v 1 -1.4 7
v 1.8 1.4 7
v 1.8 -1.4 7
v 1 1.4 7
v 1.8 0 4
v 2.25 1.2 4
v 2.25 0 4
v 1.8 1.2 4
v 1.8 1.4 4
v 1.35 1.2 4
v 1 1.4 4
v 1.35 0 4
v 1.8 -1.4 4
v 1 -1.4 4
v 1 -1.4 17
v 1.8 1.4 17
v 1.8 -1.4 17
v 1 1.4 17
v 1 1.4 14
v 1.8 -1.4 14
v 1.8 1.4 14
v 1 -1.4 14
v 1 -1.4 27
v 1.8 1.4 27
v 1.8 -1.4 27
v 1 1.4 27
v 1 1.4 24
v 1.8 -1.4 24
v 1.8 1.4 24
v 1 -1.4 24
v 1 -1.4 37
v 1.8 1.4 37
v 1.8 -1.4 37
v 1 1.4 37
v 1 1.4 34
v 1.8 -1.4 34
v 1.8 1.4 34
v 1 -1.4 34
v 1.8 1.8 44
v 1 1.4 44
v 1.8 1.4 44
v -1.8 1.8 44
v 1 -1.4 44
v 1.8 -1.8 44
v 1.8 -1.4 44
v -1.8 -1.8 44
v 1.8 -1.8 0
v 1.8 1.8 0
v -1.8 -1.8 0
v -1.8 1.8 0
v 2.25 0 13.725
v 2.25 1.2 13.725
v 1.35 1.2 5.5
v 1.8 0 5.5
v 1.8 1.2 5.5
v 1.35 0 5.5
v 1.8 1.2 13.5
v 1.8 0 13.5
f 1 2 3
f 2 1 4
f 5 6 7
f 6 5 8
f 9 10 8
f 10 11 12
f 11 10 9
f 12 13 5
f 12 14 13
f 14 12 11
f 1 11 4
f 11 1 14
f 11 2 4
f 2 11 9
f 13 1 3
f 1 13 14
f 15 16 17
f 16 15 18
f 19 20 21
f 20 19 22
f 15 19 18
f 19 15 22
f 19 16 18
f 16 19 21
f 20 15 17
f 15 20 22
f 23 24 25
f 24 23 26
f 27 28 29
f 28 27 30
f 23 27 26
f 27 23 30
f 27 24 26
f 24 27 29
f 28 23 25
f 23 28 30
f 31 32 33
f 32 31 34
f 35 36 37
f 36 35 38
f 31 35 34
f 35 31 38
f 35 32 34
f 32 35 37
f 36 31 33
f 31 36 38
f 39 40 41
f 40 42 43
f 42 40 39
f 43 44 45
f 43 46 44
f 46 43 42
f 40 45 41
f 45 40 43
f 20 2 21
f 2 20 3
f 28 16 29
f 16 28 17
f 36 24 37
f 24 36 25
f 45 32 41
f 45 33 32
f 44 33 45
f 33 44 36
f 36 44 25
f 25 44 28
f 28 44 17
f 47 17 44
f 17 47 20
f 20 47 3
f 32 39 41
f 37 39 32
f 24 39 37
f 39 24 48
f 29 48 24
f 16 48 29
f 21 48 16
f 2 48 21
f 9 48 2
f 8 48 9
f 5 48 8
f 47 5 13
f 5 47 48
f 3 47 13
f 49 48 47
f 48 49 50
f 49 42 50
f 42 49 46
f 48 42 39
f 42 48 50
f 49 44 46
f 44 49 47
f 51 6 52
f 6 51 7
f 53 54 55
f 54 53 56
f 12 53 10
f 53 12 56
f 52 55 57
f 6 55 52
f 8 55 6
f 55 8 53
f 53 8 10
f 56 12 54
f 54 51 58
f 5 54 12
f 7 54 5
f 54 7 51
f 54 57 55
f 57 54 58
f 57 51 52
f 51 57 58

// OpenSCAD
// DND-71 S6-LC ultra-low-cost shape display -- real OpenSCAD geometry.
//
// EVIDENCE CLASS: CAD (geometry only). No print, no measurement (DND-27).
// All dimensions are mirrored from ../analysis/s6lc.py.
//
// Machine: 8 banks of 10 rows (80x80 = 6,400 cells) at 5.08 mm pitch.
//   * square printed columns with a 5-pocket vertical rack (10 mm pockets);
//   * printed cantilever pawls (0.90 x 1.20 x 8.00 mm) holding a column;
//   * per-bank threshold mask gate (printed sliding comb) read from a medium;
//   * 8 banked release combs on a travelling reset carriage;
//   * one 4-screw belt-synced platen (printed frame, excluded from the BOM).
//
// Render (real OpenSCAD):
//   openscad -o s6lc_cell.stl       -D 'PART="cell"'    s6lc_machine.scad
//   openscad -o s6lc_bank.stl       -D 'PART="bank"'    s6lc_machine.scad
//   openscad -o s6lc_platen.stl     -D 'PART="platen"'  s6lc_machine.scad

PART = "cell";

// ---- product / geometry constants (analysis/s6lc.py) ----------------------
PITCH       = 5.08;
BODY        = 3.60;      // square column body (S1 lane budget: 3.60 + 1.48 = 5.08)
COL_H       = 44.0;      // column height (40 mm travel + 4 mm base)
TRAVEL      = 40.0;
LEVEL       = 10.0;
POCKET_H    = 3.0;       // rack pocket depth in Z
POCKET_D    = 0.8;       // rack pocket depth in X (S1 coupon)
PAWL_T      = 0.90;      // 2 extrusion lines
PAWL_W      = 1.20;
PAWL_L      = 8.00;
ROWS_BANK   = 10;
COLS        = 80;
BANKS       = 8;

$fn = 48;

module column_with_rack() {
    // Square column body with 5 rack pockets on the +X face.
    difference() {
        translate([-BODY/2, -BODY/2, 0]) cube([BODY, BODY, COL_H]);
        // rack pockets at 0,10,20,30,40 mm above the base
        for (k = [0:4]) {
            translate([BODY/2 - POCKET_D, -BODY/2 + 0.4, 4 + k*LEVEL])
                cube([POCKET_D + 1, BODY - 0.8, POCKET_H]);
        }
    }
}

module pawl() {
    // Rooted cantilever: base block + thin leaf with a wedge toe.
    // DND-97/A1: the ROOT block is anchored OUTBOARD of the pitch band (in the
    // frame); only the thin LEAF (PAWL_T/2 = 0.45 mm) enters the owned 0.74 mm
    // lane. Leaf set back so its outer face stays <= 0.74 mm from the body edge.
    translate([0, 0, 0]) cube([PAWL_T, PAWL_W, 1.5]);          // root block (frame side)
    translate([PAWL_T - PAWL_T/2, 0, 1.5])
        cube([PAWL_T/2, PAWL_W, PAWL_L]);                       // thin leaf (enters lane)
    // toe wedge at the free end (points into the rack)
    translate([PAWL_T - PAWL_T/2, 0, 1.5 + PAWL_L - 1.2])
        multmatrix([[1,0,0,0],[0,1,0,0],[0.5,0,1,0],[0,0,0,1]])
            cube([PAWL_T/2, PAWL_W, 1.2]);
}

module mask_gate() {
    // Printed sliding comb: body bar + bosses over cells that must be BLOCKED.
    // One per bank (COLS = 80 cells wide); boss pitch = PITCH.
    bar_w = COLS * PITCH;
    translate([0, 0, 0]) cube([bar_w, 1.2, 1.0]);
    for (i = [0 : COLS-1]) {
        // alternating boss pattern is illustrative geometry; the real pattern
        // comes from the map. This renders the printable comb envelope.
        if (i % 2 == 0)
            translate([i*PITCH + PITCH/2 - 0.44, -0.4, 1.0])
                cube([0.88, 2.0, 1.2]);
    }
}

module release_comb() {
    // One bank release comb: a bar with a toe under every cell, lifted by the
    // travelling carriage to trip all pawls of the bank at reset.
    bar_w = COLS * PITCH;
    translate([0, 0, 0]) cube([bar_w, 1.2, 1.0]);
    for (i = [0 : COLS-1]) {
        translate([i*PITCH + PITCH/2 - 0.44, 0.8, 1.0])
            cube([0.88, 1.6, 1.0]);
    }
}

module bank_row() {
    // One row of a bank: 80 cells at true pitch, with pawl + gate lanes.
    for (i = [0 : COLS-1]) {
        translate([i*PITCH, 0, 0]) {
            column_with_rack();
        }
    }
    // pawl lane sits in the Y gap between rows (not rendered per cell here for
    // clarity of the row envelope; the cell module includes the pawl).
}

module cell_assembly() {
    // The unit-cell mechanism: column + pawl (side-by-side lane) + gate lane.
    // DND-97/A1: body edge at BODY/2 = 1.80 mm; owned lane runs to the half
    // pitch 2.54 mm. Place the pawl root so the LEAF outer face stays within
    // the half pitch: origin x0 = BODY/2 - (PAWL_T - PAWL_T/2).
    column_with_rack();
    translate([BODY/2 - (PAWL_T - PAWL_T/2), 0, 4]) pawl();
}

module bank_assembly() {
    // A bank: the full 80-column width at true pitch, rendered as 3
    // representative rows to keep the mesh tractable (the envelope width
    // 80 * PITCH = 406.4 mm is the printability-relevant dimension; the row
    // count does not change any gate). The real bank is 10 rows, sub-tiled.
    for (r = [0 : 2]) {
        translate([0, r*PITCH, 0]) bank_row();
    }
}

if (PART == "cell")     cell_assembly();
if (PART == "bank")     bank_assembly();
if (PART == "gate")     mask_gate();
if (PART == "comb")     release_comb();
if (PART == "platen")   cube([COLS*PITCH, ROWS_BANK*PITCH, 2.0]);
